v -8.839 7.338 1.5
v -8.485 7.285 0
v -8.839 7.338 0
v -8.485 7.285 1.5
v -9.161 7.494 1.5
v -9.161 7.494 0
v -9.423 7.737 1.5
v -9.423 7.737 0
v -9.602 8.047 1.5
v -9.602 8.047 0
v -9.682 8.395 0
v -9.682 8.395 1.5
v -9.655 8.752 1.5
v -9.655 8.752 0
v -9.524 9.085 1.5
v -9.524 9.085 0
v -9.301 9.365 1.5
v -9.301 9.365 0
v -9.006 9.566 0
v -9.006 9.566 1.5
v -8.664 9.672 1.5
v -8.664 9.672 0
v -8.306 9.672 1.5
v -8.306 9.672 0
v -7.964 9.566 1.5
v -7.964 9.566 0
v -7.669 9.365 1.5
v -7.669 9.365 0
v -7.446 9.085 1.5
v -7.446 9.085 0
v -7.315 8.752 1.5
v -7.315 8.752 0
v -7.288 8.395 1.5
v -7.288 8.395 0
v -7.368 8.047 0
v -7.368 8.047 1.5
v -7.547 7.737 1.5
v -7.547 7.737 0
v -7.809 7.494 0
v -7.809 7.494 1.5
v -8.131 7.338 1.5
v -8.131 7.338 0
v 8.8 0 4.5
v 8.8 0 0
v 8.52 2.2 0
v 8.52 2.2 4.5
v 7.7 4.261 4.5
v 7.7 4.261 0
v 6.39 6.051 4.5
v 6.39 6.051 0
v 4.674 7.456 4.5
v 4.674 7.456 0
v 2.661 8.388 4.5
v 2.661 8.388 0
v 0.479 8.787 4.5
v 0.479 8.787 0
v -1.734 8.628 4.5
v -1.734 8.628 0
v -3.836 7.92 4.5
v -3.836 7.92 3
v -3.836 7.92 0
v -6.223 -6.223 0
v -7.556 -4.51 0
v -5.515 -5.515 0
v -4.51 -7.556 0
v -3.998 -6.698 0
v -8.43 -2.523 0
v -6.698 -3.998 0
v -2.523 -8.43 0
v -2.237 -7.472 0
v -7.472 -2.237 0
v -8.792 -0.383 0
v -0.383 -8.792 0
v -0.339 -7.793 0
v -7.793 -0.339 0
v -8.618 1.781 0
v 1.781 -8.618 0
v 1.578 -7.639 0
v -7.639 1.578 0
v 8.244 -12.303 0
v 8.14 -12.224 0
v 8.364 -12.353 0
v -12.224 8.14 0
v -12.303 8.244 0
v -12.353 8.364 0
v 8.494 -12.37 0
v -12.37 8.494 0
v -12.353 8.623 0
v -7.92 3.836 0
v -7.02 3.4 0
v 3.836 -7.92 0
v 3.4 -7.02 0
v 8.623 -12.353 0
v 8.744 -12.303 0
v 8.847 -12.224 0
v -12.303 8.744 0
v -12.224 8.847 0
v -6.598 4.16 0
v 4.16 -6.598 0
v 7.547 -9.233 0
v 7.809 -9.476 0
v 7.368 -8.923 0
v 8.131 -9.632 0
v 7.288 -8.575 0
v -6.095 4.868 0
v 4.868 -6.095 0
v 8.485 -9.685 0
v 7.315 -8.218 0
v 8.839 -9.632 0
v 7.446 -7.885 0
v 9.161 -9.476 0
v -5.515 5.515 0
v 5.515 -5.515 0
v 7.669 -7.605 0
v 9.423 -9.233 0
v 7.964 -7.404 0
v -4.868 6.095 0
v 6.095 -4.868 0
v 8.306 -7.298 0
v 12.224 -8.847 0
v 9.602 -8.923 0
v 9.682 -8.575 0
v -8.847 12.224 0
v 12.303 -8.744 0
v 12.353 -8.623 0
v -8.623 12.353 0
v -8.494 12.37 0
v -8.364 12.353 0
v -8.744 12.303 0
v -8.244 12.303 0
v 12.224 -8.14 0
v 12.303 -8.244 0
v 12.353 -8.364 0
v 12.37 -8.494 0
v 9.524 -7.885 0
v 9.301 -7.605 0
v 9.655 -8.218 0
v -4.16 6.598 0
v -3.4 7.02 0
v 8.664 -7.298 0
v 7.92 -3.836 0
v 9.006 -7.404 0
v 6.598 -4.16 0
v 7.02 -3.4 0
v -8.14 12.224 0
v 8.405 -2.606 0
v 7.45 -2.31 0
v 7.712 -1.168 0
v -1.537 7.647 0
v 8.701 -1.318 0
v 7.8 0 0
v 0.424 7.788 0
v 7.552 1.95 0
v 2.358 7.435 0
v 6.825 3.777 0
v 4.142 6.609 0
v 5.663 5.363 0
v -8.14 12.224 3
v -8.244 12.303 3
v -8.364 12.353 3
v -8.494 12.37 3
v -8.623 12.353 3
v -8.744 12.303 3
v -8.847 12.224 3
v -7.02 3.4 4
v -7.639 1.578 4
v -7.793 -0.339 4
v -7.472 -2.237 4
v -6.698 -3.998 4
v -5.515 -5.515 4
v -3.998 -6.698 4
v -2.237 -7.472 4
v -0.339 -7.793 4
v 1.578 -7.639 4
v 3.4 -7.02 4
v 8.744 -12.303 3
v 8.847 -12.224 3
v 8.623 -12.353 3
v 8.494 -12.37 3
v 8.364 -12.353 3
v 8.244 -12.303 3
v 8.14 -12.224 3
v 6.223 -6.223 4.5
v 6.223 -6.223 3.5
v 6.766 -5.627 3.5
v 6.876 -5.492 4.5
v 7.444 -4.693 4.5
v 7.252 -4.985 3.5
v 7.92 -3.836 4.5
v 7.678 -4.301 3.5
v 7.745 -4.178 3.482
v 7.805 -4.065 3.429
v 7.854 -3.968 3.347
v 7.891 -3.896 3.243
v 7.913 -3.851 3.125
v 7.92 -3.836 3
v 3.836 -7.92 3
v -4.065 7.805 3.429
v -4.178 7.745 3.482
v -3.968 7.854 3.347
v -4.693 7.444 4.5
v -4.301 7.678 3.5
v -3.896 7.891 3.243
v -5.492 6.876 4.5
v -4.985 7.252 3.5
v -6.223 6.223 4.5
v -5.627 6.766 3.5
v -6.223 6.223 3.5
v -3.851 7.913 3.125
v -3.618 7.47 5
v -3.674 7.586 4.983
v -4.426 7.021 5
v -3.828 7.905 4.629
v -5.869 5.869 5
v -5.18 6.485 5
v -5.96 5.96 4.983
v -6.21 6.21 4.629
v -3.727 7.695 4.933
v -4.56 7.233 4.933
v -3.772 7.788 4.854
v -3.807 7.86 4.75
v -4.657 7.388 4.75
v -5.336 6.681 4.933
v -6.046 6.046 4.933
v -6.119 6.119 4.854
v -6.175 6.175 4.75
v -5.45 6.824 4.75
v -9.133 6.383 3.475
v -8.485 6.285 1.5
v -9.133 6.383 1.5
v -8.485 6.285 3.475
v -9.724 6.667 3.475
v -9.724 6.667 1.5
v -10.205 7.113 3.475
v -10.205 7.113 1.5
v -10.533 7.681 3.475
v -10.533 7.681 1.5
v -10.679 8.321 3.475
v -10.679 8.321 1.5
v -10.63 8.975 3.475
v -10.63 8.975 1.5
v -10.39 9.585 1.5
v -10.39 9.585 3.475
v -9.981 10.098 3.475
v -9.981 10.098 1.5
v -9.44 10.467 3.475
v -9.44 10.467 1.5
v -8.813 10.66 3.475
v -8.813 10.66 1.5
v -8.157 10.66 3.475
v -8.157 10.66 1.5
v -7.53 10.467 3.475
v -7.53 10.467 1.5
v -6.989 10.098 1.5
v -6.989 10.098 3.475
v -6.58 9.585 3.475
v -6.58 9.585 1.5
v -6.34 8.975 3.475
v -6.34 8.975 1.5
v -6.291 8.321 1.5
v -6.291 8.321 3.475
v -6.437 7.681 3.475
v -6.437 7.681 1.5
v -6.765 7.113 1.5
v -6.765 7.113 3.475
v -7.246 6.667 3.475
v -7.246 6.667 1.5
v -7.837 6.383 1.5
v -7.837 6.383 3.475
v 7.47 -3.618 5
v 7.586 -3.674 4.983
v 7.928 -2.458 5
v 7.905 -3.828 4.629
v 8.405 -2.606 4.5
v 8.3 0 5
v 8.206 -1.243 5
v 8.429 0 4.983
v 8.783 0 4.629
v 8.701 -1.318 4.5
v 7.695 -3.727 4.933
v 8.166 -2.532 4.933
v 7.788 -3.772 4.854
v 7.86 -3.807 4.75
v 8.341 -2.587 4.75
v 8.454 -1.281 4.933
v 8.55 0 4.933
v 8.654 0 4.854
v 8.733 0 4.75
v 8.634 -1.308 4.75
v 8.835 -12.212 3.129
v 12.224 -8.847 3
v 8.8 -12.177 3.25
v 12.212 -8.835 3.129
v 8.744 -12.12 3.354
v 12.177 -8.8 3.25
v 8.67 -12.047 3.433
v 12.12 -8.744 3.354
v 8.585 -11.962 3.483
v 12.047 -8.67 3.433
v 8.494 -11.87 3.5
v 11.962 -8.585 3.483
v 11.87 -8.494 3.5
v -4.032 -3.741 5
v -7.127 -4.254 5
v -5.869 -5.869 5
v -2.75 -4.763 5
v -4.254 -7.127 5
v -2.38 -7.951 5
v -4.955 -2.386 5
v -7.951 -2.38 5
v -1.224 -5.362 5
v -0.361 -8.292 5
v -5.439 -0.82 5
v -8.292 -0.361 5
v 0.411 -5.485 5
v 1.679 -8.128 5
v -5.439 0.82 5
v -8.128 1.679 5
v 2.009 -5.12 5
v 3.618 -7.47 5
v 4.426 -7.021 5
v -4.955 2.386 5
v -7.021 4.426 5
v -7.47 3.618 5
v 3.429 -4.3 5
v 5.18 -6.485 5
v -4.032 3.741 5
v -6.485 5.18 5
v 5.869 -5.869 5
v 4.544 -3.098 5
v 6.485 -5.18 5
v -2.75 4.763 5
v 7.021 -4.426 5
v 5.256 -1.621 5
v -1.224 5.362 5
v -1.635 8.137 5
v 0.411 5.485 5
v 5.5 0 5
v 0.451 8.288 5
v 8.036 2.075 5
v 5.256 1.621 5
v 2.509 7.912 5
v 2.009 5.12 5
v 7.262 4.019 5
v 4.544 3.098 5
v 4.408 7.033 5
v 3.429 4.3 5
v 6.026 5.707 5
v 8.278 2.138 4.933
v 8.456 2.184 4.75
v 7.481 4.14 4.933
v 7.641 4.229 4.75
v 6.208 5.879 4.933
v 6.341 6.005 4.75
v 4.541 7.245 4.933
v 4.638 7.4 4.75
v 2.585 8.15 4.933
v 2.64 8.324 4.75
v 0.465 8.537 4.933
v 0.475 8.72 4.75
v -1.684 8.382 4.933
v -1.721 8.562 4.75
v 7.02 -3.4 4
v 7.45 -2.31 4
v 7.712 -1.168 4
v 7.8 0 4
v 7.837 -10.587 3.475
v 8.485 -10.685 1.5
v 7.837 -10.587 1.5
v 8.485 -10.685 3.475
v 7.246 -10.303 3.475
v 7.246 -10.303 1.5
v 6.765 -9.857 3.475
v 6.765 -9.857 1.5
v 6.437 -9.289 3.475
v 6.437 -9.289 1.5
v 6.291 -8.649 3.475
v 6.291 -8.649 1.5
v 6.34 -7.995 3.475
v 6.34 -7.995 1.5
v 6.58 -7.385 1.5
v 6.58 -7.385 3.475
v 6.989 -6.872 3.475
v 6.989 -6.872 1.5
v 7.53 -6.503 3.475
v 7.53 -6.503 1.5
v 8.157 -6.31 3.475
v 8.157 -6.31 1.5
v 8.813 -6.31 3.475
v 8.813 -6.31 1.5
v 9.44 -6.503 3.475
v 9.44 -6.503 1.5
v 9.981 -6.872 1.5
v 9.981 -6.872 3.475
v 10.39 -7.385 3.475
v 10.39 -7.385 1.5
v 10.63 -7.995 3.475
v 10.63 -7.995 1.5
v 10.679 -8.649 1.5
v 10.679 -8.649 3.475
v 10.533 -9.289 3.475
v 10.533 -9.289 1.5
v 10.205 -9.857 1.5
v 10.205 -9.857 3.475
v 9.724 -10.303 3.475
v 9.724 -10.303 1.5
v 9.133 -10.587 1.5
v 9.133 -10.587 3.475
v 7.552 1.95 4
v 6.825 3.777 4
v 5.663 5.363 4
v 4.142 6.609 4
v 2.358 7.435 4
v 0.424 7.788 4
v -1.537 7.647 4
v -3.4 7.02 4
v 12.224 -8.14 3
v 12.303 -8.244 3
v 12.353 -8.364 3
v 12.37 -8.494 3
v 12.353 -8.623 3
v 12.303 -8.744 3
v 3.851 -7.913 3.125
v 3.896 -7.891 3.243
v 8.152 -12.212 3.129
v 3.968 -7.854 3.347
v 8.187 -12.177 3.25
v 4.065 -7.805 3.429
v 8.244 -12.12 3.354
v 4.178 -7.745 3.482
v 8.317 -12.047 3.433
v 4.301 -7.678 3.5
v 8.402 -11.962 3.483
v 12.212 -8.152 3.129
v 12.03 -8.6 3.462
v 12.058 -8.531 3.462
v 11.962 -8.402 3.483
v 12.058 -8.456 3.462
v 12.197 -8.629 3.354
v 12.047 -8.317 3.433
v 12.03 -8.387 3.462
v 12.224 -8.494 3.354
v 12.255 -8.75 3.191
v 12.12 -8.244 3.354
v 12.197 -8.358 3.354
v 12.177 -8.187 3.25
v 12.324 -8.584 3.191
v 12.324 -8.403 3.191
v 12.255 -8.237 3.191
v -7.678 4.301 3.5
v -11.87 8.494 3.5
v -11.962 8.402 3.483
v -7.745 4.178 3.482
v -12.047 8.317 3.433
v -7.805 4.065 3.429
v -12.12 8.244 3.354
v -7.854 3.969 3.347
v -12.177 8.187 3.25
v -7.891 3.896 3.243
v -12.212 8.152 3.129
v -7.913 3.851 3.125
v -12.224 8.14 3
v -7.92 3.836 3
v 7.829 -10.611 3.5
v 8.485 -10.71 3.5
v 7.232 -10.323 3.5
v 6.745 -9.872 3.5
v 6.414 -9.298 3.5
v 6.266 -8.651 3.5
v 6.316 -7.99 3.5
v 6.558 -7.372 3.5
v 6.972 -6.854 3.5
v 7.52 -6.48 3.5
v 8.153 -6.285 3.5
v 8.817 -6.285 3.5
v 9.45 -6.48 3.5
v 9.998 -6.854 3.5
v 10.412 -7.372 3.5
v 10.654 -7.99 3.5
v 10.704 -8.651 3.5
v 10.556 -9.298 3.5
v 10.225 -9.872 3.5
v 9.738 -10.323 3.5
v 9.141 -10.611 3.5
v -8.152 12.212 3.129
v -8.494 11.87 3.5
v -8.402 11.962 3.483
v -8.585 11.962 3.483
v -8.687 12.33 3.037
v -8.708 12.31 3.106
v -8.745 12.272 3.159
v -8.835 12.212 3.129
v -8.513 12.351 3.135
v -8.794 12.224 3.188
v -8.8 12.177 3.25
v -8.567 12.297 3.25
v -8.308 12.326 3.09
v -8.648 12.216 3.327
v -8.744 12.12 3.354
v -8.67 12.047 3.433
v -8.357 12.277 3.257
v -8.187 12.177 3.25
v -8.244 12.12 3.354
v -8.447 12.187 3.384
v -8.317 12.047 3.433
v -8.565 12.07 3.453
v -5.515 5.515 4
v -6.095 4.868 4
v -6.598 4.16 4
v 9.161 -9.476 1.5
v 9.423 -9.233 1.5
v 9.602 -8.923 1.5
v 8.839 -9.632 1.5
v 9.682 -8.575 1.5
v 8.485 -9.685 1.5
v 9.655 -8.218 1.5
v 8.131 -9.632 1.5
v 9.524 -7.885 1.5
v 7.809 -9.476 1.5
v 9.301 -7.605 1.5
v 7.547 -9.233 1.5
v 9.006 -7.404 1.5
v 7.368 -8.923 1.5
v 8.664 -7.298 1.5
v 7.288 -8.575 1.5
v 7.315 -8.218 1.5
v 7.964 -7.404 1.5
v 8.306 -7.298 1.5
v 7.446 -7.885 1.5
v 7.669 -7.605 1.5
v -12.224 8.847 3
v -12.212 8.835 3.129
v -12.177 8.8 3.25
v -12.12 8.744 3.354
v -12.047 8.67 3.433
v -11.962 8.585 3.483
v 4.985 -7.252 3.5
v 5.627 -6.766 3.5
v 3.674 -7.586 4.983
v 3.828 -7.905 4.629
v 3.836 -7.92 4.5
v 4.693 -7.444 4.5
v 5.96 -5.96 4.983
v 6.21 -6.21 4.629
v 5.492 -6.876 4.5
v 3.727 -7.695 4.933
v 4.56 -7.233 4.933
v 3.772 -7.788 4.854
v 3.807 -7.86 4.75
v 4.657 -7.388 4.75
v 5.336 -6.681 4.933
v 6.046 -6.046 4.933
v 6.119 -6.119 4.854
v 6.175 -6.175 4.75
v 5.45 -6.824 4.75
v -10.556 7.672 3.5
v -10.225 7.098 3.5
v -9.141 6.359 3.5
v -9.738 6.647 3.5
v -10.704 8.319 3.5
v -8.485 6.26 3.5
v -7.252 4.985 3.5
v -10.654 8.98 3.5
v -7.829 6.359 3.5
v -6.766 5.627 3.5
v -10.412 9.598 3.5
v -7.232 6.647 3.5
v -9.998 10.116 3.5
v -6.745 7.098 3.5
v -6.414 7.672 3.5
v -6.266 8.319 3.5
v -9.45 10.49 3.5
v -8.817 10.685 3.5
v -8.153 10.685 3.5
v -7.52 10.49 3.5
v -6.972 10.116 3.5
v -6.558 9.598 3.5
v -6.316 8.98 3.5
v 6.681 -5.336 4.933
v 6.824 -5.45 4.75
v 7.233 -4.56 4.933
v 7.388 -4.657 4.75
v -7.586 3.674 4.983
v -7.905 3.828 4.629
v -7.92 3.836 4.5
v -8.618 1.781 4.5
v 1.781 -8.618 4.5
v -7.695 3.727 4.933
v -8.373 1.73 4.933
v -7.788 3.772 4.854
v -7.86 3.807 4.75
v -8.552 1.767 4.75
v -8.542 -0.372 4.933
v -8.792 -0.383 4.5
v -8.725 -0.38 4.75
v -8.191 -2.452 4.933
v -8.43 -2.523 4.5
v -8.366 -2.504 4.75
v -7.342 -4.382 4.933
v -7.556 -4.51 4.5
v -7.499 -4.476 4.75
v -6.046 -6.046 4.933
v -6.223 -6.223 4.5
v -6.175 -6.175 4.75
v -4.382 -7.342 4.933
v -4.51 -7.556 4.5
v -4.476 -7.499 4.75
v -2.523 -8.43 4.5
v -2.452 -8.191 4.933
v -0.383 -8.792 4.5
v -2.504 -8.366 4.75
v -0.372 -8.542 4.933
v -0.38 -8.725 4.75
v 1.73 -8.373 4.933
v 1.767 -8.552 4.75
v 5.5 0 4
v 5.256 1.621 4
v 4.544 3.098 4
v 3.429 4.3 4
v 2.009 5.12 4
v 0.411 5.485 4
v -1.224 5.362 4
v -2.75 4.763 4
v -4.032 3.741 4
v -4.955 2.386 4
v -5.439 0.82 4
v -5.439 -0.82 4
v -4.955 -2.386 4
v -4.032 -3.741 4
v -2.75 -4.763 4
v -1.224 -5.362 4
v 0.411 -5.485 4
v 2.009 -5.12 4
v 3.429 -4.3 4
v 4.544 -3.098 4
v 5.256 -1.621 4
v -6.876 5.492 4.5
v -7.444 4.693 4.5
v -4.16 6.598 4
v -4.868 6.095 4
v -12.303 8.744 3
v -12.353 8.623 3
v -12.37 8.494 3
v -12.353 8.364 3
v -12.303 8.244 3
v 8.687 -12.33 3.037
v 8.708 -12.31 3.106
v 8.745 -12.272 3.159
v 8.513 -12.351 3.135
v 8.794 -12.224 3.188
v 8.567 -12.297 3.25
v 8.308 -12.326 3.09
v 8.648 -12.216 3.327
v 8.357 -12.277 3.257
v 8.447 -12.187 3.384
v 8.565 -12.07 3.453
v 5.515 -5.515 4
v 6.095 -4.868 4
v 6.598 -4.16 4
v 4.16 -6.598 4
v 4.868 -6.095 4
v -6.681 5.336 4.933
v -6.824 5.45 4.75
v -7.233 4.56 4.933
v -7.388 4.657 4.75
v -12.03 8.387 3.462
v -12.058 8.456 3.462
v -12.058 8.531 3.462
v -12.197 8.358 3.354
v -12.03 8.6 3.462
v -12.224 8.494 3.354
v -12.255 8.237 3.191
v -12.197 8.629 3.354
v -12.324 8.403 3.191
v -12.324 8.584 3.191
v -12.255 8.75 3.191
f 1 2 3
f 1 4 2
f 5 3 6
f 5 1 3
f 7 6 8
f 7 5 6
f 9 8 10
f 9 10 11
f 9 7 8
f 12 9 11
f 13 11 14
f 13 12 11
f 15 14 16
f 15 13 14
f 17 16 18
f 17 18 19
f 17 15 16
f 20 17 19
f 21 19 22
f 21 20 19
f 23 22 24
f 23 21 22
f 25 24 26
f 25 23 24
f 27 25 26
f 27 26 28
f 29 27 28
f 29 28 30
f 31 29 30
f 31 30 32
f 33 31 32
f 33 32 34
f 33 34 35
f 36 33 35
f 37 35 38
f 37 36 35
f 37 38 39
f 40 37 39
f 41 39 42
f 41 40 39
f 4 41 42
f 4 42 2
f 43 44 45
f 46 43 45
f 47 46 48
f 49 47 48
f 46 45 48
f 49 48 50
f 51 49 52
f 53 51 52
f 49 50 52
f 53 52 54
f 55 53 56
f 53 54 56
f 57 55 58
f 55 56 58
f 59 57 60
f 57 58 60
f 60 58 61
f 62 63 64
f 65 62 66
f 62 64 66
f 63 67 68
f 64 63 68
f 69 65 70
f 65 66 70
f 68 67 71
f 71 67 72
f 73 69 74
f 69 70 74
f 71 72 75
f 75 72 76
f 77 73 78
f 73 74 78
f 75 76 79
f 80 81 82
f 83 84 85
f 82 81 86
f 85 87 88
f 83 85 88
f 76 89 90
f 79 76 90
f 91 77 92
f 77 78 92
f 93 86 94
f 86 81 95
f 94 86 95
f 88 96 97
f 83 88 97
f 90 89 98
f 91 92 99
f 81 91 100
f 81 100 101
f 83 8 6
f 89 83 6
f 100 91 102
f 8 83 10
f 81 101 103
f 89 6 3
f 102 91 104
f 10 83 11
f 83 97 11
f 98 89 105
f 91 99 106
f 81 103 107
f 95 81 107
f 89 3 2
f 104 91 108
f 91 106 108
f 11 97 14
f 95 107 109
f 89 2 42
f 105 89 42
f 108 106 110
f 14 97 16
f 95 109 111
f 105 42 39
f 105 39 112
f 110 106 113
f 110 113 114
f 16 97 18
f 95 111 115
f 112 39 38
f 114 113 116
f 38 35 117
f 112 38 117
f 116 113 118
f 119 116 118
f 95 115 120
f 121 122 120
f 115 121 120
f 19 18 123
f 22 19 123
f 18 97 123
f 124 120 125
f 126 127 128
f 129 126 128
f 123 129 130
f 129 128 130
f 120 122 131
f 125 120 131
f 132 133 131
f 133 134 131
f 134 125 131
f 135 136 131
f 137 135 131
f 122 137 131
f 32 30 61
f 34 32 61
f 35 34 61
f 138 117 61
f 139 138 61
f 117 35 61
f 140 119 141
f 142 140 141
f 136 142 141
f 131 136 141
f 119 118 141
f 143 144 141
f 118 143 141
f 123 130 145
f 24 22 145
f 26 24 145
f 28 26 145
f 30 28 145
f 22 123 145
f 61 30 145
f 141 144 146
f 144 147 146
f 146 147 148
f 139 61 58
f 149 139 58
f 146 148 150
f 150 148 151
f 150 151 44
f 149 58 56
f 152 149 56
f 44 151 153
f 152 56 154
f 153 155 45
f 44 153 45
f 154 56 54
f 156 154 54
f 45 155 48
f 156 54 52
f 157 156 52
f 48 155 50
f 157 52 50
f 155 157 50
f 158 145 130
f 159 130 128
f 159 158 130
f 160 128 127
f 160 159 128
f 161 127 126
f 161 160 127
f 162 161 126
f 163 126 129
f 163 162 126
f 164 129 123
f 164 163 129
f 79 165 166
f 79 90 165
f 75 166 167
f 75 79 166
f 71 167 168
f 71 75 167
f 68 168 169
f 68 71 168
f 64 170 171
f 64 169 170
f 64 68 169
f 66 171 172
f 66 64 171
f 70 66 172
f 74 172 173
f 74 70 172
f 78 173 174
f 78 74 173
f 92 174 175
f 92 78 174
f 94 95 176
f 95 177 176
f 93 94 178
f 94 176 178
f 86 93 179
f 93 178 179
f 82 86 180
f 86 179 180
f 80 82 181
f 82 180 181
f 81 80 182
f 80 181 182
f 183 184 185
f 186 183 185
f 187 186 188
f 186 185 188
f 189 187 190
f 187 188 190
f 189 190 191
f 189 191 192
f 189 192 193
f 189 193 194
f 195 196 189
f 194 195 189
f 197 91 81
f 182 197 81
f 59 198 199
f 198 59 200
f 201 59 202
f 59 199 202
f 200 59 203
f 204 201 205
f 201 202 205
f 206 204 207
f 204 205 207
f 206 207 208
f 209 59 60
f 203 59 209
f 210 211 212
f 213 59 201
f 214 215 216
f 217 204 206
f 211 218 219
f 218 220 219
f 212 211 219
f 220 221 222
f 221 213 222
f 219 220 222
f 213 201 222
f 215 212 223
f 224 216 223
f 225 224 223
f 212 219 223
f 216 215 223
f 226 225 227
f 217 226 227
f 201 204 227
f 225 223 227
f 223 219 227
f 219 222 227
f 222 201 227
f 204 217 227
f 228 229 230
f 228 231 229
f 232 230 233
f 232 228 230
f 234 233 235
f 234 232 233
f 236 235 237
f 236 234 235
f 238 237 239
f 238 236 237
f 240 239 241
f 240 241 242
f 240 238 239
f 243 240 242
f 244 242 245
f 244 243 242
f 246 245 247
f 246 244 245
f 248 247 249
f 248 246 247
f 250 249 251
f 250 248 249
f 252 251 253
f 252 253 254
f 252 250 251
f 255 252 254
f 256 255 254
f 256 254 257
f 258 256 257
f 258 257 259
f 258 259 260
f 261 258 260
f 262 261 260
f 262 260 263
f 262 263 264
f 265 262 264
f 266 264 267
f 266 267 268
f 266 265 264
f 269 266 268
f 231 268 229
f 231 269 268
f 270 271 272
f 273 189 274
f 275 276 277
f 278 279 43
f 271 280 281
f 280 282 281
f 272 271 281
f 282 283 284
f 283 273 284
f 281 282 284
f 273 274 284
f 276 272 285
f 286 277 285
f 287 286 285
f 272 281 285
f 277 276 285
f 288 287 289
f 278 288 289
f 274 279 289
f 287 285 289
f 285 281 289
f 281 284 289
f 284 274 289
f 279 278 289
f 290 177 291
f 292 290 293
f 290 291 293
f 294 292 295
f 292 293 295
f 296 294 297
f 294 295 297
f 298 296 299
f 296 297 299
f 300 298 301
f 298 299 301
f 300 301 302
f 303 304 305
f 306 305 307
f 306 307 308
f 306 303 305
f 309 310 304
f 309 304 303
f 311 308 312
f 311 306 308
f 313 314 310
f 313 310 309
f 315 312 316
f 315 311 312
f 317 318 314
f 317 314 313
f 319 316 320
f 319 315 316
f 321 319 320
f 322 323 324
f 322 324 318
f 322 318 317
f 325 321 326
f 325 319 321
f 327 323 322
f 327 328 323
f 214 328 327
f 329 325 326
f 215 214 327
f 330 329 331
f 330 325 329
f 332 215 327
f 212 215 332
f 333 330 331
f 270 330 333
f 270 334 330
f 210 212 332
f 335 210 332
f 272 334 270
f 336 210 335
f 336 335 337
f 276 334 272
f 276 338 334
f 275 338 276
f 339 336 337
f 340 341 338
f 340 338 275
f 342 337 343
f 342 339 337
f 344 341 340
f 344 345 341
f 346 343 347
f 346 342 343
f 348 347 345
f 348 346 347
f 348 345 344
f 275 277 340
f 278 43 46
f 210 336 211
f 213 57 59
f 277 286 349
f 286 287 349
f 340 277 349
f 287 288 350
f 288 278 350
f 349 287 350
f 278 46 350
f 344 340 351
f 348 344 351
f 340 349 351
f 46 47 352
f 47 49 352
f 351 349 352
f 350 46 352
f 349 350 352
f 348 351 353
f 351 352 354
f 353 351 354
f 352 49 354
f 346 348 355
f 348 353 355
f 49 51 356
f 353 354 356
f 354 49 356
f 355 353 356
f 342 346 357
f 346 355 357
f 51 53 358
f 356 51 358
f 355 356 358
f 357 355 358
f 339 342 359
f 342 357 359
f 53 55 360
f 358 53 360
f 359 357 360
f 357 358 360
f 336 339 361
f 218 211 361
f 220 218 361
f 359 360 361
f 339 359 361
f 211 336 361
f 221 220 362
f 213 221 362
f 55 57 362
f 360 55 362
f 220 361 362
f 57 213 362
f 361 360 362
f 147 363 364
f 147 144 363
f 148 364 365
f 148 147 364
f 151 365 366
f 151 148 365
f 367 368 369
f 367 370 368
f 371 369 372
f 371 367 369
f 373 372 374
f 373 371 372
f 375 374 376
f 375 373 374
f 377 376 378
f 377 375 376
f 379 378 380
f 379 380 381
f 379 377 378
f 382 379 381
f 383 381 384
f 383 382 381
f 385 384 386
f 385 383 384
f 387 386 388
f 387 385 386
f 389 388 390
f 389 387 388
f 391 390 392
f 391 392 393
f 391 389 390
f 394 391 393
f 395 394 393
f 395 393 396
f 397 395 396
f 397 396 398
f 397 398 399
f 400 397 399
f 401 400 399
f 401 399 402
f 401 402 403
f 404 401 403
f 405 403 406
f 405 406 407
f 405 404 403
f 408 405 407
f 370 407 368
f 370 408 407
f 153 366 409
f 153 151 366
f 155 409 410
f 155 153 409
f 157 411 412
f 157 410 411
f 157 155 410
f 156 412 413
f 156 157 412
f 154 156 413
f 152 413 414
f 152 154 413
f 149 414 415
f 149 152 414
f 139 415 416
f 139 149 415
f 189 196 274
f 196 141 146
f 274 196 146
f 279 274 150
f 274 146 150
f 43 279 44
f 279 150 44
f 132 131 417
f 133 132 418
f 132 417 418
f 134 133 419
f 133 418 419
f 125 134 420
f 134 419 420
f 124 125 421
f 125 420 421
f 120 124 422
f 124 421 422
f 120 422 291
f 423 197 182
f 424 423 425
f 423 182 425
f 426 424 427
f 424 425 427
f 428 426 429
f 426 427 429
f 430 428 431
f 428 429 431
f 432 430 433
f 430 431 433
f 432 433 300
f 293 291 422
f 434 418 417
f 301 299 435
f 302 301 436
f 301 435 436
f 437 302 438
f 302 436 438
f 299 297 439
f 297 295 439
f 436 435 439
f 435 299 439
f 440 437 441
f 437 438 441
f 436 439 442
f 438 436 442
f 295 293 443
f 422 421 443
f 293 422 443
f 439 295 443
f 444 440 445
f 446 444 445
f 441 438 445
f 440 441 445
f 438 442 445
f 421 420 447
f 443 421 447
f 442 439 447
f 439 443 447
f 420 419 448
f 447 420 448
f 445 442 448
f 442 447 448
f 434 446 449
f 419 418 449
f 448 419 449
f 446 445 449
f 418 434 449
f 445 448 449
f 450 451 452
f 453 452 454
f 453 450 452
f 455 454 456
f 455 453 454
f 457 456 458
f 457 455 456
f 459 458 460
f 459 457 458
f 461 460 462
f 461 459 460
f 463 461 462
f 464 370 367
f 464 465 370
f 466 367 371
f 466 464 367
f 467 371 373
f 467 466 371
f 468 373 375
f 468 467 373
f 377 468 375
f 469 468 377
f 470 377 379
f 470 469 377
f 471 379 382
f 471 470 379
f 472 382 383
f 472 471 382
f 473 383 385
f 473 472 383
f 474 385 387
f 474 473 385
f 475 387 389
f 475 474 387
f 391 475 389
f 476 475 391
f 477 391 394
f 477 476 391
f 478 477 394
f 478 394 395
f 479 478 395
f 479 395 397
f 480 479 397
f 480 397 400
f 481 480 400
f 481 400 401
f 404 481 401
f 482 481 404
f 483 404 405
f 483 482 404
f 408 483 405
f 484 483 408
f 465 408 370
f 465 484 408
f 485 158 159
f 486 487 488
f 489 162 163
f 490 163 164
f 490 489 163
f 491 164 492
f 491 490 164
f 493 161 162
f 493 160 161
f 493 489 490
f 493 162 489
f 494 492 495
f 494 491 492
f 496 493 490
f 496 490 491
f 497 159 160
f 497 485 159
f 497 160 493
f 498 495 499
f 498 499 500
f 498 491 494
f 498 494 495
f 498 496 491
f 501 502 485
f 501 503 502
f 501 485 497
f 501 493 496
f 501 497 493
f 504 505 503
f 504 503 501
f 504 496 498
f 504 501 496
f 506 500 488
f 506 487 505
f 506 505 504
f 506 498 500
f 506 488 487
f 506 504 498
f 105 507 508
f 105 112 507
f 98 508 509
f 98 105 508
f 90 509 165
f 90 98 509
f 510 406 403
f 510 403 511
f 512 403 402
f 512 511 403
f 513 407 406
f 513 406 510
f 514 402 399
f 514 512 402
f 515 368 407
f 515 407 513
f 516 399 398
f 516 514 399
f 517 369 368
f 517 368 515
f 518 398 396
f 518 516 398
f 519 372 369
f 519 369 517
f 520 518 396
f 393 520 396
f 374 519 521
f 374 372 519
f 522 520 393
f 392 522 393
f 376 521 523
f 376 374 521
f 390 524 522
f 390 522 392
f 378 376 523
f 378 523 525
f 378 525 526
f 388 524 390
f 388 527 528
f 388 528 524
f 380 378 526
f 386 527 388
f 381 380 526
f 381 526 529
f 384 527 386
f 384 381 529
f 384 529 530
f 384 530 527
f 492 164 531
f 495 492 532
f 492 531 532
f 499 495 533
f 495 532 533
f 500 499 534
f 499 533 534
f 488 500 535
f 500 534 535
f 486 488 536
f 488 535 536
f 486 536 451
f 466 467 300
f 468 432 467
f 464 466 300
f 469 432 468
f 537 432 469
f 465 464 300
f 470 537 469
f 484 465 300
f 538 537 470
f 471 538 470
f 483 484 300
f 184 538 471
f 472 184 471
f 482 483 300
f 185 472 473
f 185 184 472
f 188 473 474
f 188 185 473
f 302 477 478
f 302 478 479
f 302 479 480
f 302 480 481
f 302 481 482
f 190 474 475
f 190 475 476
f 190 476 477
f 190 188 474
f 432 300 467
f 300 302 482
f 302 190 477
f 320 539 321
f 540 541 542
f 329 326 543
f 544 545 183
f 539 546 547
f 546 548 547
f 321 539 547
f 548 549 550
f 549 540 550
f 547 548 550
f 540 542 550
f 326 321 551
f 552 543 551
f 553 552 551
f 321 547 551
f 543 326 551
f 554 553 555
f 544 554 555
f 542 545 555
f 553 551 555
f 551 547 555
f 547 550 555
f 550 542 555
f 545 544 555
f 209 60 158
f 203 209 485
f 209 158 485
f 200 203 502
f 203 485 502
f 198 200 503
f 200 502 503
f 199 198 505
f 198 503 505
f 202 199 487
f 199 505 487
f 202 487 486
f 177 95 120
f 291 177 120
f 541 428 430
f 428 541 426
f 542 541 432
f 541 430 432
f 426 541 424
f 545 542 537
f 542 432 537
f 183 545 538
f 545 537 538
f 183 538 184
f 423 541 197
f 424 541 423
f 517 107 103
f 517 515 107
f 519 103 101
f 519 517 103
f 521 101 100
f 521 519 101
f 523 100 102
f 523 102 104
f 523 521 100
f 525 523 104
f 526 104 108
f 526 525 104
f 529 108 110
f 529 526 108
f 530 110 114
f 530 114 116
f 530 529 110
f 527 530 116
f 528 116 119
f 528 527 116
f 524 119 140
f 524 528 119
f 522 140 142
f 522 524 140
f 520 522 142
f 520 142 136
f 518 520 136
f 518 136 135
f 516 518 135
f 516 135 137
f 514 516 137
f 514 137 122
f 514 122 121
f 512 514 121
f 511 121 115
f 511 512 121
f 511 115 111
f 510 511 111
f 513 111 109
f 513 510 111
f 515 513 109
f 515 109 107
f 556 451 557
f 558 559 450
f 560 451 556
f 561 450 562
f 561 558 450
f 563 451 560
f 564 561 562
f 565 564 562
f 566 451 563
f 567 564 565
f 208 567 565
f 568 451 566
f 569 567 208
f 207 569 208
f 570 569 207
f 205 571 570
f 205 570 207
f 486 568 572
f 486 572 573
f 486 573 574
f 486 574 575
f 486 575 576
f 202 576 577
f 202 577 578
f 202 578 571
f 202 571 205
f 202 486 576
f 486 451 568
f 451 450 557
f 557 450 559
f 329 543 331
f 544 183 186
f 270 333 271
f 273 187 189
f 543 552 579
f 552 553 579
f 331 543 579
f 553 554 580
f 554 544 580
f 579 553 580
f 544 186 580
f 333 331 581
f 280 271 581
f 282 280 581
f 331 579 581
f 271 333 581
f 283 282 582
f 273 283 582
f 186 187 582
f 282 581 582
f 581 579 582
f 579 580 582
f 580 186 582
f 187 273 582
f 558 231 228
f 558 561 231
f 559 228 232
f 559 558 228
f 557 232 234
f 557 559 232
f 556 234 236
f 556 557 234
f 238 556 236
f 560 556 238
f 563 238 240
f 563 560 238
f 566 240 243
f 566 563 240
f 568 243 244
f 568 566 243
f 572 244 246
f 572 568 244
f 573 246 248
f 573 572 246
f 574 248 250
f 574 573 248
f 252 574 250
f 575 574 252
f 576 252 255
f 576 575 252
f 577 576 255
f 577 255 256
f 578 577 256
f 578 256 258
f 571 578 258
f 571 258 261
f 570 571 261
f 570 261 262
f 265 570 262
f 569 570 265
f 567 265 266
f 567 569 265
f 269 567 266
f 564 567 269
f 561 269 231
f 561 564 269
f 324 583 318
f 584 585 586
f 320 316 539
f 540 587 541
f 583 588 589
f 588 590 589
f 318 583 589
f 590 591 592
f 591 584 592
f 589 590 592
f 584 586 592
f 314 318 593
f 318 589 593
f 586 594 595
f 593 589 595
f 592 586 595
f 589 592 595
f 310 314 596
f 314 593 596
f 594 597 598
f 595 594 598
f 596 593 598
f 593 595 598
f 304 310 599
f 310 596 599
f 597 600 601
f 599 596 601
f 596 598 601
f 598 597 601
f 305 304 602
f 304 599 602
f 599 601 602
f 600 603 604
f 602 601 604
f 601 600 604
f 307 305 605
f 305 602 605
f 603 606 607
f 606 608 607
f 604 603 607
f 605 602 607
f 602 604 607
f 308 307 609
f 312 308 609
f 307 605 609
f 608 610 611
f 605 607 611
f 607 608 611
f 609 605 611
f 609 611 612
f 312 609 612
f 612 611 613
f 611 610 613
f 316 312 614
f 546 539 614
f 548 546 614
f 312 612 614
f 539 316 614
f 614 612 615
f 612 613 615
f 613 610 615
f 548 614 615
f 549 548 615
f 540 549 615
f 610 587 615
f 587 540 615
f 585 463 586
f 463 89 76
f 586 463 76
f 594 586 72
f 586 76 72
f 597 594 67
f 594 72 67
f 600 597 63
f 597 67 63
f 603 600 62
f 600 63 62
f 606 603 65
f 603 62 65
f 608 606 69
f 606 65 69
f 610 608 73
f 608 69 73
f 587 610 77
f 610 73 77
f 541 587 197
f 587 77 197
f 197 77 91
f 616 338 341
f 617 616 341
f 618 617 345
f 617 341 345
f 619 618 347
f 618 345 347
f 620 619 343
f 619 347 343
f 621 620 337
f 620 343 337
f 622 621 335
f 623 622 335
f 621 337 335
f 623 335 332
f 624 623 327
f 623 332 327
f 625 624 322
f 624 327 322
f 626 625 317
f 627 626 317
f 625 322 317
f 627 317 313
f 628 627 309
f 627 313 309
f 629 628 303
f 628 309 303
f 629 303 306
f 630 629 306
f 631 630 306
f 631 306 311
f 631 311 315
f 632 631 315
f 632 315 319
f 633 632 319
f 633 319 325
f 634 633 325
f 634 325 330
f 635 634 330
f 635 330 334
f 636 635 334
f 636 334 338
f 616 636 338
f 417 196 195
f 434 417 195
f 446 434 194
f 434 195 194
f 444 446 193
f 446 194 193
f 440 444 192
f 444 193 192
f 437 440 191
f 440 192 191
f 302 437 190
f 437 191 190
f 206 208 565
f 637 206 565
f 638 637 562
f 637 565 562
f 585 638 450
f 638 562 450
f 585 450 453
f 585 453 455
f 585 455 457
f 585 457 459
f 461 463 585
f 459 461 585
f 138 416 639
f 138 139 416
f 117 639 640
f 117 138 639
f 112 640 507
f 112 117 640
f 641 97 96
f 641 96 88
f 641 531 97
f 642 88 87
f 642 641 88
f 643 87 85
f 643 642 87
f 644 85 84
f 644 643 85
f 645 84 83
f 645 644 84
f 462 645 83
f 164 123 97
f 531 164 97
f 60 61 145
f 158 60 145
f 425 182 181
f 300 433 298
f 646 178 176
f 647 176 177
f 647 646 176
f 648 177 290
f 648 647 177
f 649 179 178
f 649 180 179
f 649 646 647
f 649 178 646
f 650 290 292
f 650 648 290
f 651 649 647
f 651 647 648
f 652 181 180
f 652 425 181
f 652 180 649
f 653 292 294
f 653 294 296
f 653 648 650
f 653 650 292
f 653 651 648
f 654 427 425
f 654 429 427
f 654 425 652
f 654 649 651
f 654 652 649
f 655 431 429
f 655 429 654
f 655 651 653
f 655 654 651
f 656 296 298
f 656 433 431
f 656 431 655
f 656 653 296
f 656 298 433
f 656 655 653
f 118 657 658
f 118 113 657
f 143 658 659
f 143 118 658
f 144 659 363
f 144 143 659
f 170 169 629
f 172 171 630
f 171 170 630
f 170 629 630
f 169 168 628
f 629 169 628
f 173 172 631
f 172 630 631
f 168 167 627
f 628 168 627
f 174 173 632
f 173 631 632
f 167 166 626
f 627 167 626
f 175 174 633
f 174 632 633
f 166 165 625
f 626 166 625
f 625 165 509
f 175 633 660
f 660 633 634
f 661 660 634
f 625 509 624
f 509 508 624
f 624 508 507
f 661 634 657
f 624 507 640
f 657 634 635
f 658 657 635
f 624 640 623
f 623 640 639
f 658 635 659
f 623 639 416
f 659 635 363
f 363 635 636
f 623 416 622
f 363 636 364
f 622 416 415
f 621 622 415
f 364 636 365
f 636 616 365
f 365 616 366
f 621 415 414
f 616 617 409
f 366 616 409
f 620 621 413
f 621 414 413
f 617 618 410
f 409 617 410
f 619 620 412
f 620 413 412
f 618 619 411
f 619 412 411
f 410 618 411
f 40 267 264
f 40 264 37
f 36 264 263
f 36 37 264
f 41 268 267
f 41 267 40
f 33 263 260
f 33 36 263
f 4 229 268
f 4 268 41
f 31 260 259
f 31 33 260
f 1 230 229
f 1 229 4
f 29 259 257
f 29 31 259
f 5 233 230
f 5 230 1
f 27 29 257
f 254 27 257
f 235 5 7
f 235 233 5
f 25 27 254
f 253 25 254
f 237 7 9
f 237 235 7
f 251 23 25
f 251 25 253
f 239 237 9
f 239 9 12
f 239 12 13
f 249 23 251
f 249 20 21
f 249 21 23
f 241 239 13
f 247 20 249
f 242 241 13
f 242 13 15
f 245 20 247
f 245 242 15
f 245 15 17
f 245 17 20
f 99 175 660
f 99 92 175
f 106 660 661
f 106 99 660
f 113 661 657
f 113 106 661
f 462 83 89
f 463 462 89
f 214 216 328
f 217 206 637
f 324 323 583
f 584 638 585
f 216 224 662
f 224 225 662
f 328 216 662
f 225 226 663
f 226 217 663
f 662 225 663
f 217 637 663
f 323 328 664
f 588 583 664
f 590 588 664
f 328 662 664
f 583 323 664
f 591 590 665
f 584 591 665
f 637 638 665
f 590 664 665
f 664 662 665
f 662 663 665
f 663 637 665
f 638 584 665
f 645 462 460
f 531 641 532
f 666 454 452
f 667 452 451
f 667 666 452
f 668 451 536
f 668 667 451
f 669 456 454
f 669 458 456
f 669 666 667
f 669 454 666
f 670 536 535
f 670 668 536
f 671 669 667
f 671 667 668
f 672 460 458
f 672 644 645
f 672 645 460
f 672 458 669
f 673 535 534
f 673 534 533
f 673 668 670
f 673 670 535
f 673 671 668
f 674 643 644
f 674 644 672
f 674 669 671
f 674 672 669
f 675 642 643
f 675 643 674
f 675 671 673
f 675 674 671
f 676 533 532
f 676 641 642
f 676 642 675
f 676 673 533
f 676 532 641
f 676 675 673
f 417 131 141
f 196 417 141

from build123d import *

# Parameters (mm, degrees)
SKETCH1_R                     = 8.8
BOSS_EXTRUDE1_DEPTH           = 5
SHELL1_T                      = -1
BOSS_EXTRUDE2_DEPTH           = 3.5
CBORE_FOR_M2_SHCS1_AT_2_COUNT = 2
CBORE_FOR_M2_SHCS1_AT_2_PITCH = 23.999204153
FILLET1_R                     = 0.5
SKETCH5_R                     = 5.5
CUT_EXTRUDE1_DEPTH            = 10


with BuildPart() as part:
    # Sketch1 → Boss-Extrude1 (new body)
    with BuildSketch(Plane.XY):
        Circle(SKETCH1_R)
    extrude(amount=BOSS_EXTRUDE1_DEPTH)

    # Shell1
    shell1_openings = [part.faces().sort_by_distance(p)[0] for p in [
        (0, 0, 0),
    ]]
    offset(amount=SHELL1_T, openings=shell1_openings, kind=Kind.INTERSECTION)

    # Sketch1<4> → Boss-Extrude2 (add)
    with BuildSketch(Plane.XY):
        with BuildLine():
            ThreePointArc((-7.919955614, 3.835922715), (-7.171229209, 5.100340344), (-6.222539674, 6.222539674))
            ThreePointArc((-6.222539674, 6.222539674), (-5.100340344, 7.171229209), (-3.835922715, 7.919955614))
            Line((-3.835922715, 7.919955614), (-8.49355603, 12.577588929))
            Line((-8.49355603, 12.577588929), (-12.577588929, 8.49355603))
            Line((-12.577588929, 8.49355603), (-7.919955614, 3.835922715))
        make_face()
        with BuildLine():
            ThreePointArc((7.919955614, -3.835922715), (7.171229209, -5.100340344), (6.222539674, -6.222539674))
            ThreePointArc((6.222539674, -6.222539674), (5.100340344, -7.171229209), (3.835922715, -7.919955614))
            Line((3.835922715, -7.919955614), (8.49355603, -12.577588929))
            Line((8.49355603, -12.577588929), (12.577588929, -8.49355603))
            Line((12.577588929, -8.49355603), (7.919955614, -3.835922715))
        make_face()
    extrude(amount=BOSS_EXTRUDE2_DEPTH)

    # Sketch4 → CBORE for M2 SHCS1 (revolve, cut)
    with BuildSketch(Plane(origin=(-8.485, 8.485, 3.5), x_dir=(0, -1, 0), z_dir=(1, 0, 0))):
        Polygon((0, 0), (0, 3.5), (1.2, 3.5), (1.2, 2), (2.2, 2), (2.2, 0.025), (2.225, 0), align=None)
    cbore_for_m2_shcs1 = revolve(axis=Axis((-8.485, 8.485, 9.85), (0, 0, -1)), mode=Mode.SUBTRACT)

    # CBORE for M2 SHCS1 at 2: CBORE for M2 SHCS1 ×2
    with Locations(*[Vector(0.7071067811865476, -0.7071067811865476, 0) * (i * CBORE_FOR_M2_SHCS1_AT_2_PITCH) for i in range(1, CBORE_FOR_M2_SHCS1_AT_2_COUNT)]):
        add(cbore_for_m2_shcs1, mode=Mode.SUBTRACT)

    # Fillet1
    fillet1_edges = [part.edges().sort_by_distance(p)[0] for p in [
        (-8.49355603, 12.577588929, 1.75),
        (-6.164739372, 10.248772271, 3.5),
        (-10.535572479, 10.535572479, 3.5),
        (-12.577588929, 8.49355603, 1.75),
        (-10.248772271, 6.164739372, 3.5),
        (12.577588929, -8.49355603, 1.75),
        (10.248772271, -6.164739372, 3.5),
        (10.535572479, -10.535572479, 3.5),
        (8.49355603, -12.577588929, 1.75),
        (6.164739372, -10.248772271, 3.5),
        (-8.8, 0, 5),
    ]]
    fillet(fillet1_edges, radius=FILLET1_R)

    # Sketch5 → Cut-Extrude1 (cut)
    with BuildSketch(Plane.XY.offset(5)):
        Circle(SKETCH5_R)
    extrude(amount=-CUT_EXTRUDE1_DEPTH, mode=Mode.SUBTRACT)


solid = part.part
